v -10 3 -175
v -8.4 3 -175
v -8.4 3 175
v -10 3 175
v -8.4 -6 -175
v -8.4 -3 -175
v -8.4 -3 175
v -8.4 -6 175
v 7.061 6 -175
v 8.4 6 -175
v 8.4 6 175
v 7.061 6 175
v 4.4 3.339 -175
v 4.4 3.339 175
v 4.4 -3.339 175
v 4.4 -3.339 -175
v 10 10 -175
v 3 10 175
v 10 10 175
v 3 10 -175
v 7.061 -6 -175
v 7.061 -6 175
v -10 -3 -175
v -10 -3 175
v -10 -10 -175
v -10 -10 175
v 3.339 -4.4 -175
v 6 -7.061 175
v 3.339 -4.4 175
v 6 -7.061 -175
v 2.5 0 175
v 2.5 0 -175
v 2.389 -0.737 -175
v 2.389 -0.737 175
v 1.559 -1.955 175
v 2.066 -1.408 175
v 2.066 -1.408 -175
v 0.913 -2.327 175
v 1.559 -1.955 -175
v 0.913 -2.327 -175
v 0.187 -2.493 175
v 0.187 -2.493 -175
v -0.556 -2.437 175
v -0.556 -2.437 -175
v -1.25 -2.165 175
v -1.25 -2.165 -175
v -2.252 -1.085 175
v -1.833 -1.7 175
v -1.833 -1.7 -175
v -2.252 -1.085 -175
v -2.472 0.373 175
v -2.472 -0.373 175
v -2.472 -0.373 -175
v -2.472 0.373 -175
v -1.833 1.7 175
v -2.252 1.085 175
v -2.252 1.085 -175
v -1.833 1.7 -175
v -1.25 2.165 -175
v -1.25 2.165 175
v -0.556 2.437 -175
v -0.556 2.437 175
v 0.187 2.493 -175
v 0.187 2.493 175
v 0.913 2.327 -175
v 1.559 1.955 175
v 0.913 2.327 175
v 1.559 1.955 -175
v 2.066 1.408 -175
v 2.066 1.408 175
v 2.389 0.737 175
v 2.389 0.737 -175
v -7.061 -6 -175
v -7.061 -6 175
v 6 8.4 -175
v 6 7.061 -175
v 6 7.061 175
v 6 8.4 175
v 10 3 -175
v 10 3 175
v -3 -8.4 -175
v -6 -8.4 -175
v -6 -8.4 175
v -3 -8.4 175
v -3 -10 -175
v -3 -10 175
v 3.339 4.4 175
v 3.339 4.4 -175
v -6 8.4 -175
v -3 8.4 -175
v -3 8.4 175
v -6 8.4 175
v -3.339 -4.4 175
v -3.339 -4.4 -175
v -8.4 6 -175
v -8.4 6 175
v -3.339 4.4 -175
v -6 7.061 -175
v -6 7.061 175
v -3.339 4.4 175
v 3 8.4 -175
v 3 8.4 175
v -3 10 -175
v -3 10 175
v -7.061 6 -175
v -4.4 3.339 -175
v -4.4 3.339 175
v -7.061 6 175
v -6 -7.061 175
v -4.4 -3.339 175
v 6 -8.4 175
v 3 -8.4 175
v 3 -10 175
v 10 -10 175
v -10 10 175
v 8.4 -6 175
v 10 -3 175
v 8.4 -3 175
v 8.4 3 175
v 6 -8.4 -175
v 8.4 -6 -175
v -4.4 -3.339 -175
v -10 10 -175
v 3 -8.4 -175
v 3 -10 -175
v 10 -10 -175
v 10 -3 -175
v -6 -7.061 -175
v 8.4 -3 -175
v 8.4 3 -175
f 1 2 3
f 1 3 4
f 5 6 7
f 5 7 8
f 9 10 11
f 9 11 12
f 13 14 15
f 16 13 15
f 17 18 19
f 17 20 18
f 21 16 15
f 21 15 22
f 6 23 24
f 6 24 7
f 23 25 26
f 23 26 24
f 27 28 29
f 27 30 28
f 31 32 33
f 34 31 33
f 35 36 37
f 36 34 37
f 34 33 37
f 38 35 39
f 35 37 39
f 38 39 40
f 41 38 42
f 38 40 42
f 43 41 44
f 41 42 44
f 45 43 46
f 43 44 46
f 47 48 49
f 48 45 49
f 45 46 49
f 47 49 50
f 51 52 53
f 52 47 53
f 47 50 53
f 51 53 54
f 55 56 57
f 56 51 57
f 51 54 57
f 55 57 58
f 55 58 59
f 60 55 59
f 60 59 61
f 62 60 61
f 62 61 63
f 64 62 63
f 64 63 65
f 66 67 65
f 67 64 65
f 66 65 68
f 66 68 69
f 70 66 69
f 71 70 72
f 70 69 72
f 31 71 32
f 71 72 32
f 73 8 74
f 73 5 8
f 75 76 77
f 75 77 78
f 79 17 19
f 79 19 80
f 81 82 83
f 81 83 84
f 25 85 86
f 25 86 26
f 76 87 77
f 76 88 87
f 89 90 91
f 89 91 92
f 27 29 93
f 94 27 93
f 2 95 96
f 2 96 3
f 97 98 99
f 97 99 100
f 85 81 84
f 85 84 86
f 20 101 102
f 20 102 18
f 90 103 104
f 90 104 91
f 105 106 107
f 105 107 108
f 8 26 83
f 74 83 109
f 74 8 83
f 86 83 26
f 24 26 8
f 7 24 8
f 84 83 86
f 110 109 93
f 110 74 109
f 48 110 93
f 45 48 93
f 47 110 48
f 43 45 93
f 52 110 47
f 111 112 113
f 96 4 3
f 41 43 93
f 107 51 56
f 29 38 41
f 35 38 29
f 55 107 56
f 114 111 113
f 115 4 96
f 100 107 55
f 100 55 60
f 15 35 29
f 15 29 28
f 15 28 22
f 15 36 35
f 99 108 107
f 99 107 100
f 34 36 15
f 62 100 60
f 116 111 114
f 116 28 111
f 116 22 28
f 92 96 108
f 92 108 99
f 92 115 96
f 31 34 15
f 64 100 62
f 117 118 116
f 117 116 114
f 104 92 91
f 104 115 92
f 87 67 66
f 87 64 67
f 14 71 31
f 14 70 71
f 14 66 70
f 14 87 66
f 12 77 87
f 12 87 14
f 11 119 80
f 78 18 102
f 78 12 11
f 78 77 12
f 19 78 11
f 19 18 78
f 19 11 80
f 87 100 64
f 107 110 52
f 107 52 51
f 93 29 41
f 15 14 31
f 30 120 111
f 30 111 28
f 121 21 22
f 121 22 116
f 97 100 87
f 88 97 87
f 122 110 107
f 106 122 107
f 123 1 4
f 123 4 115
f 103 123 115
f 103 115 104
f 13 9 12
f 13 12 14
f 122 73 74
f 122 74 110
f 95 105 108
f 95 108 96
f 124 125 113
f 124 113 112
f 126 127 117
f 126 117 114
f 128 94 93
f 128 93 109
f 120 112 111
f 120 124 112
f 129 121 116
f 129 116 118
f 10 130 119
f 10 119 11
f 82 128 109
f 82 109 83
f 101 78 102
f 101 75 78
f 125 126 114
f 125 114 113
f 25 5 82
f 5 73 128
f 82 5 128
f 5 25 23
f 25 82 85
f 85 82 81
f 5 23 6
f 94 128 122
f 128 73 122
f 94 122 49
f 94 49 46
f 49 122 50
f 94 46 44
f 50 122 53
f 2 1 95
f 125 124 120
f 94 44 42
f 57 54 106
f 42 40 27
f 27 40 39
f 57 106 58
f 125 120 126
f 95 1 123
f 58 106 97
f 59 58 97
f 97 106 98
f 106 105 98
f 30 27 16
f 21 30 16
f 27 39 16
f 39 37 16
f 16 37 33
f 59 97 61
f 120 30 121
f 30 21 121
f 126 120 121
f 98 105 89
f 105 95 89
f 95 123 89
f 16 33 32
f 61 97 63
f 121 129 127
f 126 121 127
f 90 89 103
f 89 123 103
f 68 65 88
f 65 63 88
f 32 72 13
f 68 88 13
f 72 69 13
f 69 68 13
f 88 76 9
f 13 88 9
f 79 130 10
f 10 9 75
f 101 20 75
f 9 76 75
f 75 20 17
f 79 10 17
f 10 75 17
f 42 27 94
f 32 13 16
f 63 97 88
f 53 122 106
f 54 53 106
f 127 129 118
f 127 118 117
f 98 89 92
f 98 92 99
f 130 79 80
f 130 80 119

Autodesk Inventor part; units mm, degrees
ref_plane "YZ Plane" through (0, 0, 0) normal (1, 0, 0) x (0, 1, 0)
ref_plane "XZ Plane" through (0, 0, 0) normal (0, 1, 0) x (-1, 0, 0)
ref_plane "XY Plane" through (0, 0, 0) normal (0, 0, 1) x (1, 0, 0)
sketch "スケッチ1" plane through (0, 0, 0) normal (0, 0, 1) x (1, 0, 0)
  circle A0 centre (0, 0) radius 2.5
  line L0 (-10, 10) -> (10, 10) construction
  line L1 (10, 10) -> (10, -10) construction
  line L2 (10, -10) -> (-10, -10) construction
  line L3 (-10, -10) -> (-10, 10) construction
  line L4 (-3, 10) -> (-3, 8.4) construction
  line L5 (-3, 8.4) -> (-6, 8.4) construction
  line L6 (-6, 8.4) -> (-6, 7.0607) construction
  line L7 (-6, 7.0607) -> (-3.3393, 4.4) construction
  line L8 (-3.3393, 4.4) -> (3.3393, 4.4) construction
  line L9 (3.3393, 4.4) -> (6, 7.0607) construction
  line L10 (6, 7.0607) -> (6, 8.4) construction
  line L11 (6, 8.4) -> (3, 8.4) construction
  line L12 (3, 8.4) -> (3, 10) construction
  line L13 (-10, 10) -> (10, -10) construction
  line L14 (-10, 10) -> (-3, 10)
  line L15 (-3, 10) -> (-3, 8.4)
  line L16 (-3, 8.4) -> (-6, 8.4)
  line L17 (-6, 8.4) -> (-6, 7.0607)
  line L18 (-6, 7.0607) -> (-3.3393, 4.4)
  line L19 (-3.3393, 4.4) -> (3.3393, 4.4)
  line L20 (3.3393, 4.4) -> (6, 7.0607)
  line L21 (6, 7.0607) -> (6, 8.4)
  line L22 (6, 8.4) -> (3, 8.4)
  line L23 (3, 8.4) -> (3, 10)
  line L24 (3, 10) -> (10, 10)
  line L25 (-10, -10) -> (-10, -3)
  line L26 (-10, -3) -> (-8.4, -3)
  line L27 (-8.4, -3) -> (-8.4, -6)
  line L28 (-8.4, -6) -> (-7.0607, -6)
  line L29 (-7.0607, -6) -> (-4.4, -3.3393)
  line L30 (-4.4, -3.3393) -> (-4.4, 3.3393)
  line L31 (-4.4, 3.3393) -> (-7.0607, 6)
  line L32 (-8.4, 6) -> (-8.4, 3)
  line L33 (-7.0607, 6) -> (-8.4, 6)
  line L34 (-8.4, 3) -> (-10, 3)
  line L35 (-10, 3) -> (-10, 10)
  line L36 (10, -10) -> (3, -10)
  line L37 (3, -10) -> (3, -8.4)
  line L38 (3, -8.4) -> (6, -8.4)
  line L39 (6, -8.4) -> (6, -7.0607)
  line L40 (6, -7.0607) -> (3.3393, -4.4)
  line L41 (3.3393, -4.4) -> (-3.3393, -4.4)
  line L42 (-3.3393, -4.4) -> (-6, -7.0607)
  line L43 (-6, -8.4) -> (-3, -8.4)
  line L44 (-6, -7.0607) -> (-6, -8.4)
  line L45 (-3, -8.4) -> (-3, -10)
  line L46 (-3, -10) -> (-10, -10)
  line L47 (10, 10) -> (10, 3)
  line L48 (10, 3) -> (8.4, 3)
  line L49 (8.4, 3) -> (8.4, 6)
  line L50 (8.4, 6) -> (7.0607, 6)
  line L51 (7.0607, 6) -> (4.4, 3.3393)
  line L52 (4.4, 3.3393) -> (4.4, -3.3393)
  line L53 (4.4, -3.3393) -> (7.0607, -6)
  line L54 (8.4, -6) -> (8.4, -3)
  line L55 (7.0607, -6) -> (8.4, -6)
  line L56 (8.4, -3) -> (10, -3)
  line L57 (10, -3) -> (10, -10)
  point P0 (-10, 0)
  point P1 (0, 10)
  dimension "d0" = 20
  dimension "d1" = 20
  dimension "d2" = 6
  dimension "d3" = 3
  dimension "d4" = 1.6
  dimension "d5" = 4
  dimension "d6" = 12
  dimension "d7" = 6
  dimension "d8" = 135
  dimension "d9" = 135
  dimension "d10" = 0.75
  dimension "d11" = 5
  dimension "d14" = 360
extrude "押し出し1" add sketch "スケッチ1" along normal mid plane 350
equation "\"d7\" = 0.5 * d6"
equation "\"d9\" = d8"
properties part number "l350"
